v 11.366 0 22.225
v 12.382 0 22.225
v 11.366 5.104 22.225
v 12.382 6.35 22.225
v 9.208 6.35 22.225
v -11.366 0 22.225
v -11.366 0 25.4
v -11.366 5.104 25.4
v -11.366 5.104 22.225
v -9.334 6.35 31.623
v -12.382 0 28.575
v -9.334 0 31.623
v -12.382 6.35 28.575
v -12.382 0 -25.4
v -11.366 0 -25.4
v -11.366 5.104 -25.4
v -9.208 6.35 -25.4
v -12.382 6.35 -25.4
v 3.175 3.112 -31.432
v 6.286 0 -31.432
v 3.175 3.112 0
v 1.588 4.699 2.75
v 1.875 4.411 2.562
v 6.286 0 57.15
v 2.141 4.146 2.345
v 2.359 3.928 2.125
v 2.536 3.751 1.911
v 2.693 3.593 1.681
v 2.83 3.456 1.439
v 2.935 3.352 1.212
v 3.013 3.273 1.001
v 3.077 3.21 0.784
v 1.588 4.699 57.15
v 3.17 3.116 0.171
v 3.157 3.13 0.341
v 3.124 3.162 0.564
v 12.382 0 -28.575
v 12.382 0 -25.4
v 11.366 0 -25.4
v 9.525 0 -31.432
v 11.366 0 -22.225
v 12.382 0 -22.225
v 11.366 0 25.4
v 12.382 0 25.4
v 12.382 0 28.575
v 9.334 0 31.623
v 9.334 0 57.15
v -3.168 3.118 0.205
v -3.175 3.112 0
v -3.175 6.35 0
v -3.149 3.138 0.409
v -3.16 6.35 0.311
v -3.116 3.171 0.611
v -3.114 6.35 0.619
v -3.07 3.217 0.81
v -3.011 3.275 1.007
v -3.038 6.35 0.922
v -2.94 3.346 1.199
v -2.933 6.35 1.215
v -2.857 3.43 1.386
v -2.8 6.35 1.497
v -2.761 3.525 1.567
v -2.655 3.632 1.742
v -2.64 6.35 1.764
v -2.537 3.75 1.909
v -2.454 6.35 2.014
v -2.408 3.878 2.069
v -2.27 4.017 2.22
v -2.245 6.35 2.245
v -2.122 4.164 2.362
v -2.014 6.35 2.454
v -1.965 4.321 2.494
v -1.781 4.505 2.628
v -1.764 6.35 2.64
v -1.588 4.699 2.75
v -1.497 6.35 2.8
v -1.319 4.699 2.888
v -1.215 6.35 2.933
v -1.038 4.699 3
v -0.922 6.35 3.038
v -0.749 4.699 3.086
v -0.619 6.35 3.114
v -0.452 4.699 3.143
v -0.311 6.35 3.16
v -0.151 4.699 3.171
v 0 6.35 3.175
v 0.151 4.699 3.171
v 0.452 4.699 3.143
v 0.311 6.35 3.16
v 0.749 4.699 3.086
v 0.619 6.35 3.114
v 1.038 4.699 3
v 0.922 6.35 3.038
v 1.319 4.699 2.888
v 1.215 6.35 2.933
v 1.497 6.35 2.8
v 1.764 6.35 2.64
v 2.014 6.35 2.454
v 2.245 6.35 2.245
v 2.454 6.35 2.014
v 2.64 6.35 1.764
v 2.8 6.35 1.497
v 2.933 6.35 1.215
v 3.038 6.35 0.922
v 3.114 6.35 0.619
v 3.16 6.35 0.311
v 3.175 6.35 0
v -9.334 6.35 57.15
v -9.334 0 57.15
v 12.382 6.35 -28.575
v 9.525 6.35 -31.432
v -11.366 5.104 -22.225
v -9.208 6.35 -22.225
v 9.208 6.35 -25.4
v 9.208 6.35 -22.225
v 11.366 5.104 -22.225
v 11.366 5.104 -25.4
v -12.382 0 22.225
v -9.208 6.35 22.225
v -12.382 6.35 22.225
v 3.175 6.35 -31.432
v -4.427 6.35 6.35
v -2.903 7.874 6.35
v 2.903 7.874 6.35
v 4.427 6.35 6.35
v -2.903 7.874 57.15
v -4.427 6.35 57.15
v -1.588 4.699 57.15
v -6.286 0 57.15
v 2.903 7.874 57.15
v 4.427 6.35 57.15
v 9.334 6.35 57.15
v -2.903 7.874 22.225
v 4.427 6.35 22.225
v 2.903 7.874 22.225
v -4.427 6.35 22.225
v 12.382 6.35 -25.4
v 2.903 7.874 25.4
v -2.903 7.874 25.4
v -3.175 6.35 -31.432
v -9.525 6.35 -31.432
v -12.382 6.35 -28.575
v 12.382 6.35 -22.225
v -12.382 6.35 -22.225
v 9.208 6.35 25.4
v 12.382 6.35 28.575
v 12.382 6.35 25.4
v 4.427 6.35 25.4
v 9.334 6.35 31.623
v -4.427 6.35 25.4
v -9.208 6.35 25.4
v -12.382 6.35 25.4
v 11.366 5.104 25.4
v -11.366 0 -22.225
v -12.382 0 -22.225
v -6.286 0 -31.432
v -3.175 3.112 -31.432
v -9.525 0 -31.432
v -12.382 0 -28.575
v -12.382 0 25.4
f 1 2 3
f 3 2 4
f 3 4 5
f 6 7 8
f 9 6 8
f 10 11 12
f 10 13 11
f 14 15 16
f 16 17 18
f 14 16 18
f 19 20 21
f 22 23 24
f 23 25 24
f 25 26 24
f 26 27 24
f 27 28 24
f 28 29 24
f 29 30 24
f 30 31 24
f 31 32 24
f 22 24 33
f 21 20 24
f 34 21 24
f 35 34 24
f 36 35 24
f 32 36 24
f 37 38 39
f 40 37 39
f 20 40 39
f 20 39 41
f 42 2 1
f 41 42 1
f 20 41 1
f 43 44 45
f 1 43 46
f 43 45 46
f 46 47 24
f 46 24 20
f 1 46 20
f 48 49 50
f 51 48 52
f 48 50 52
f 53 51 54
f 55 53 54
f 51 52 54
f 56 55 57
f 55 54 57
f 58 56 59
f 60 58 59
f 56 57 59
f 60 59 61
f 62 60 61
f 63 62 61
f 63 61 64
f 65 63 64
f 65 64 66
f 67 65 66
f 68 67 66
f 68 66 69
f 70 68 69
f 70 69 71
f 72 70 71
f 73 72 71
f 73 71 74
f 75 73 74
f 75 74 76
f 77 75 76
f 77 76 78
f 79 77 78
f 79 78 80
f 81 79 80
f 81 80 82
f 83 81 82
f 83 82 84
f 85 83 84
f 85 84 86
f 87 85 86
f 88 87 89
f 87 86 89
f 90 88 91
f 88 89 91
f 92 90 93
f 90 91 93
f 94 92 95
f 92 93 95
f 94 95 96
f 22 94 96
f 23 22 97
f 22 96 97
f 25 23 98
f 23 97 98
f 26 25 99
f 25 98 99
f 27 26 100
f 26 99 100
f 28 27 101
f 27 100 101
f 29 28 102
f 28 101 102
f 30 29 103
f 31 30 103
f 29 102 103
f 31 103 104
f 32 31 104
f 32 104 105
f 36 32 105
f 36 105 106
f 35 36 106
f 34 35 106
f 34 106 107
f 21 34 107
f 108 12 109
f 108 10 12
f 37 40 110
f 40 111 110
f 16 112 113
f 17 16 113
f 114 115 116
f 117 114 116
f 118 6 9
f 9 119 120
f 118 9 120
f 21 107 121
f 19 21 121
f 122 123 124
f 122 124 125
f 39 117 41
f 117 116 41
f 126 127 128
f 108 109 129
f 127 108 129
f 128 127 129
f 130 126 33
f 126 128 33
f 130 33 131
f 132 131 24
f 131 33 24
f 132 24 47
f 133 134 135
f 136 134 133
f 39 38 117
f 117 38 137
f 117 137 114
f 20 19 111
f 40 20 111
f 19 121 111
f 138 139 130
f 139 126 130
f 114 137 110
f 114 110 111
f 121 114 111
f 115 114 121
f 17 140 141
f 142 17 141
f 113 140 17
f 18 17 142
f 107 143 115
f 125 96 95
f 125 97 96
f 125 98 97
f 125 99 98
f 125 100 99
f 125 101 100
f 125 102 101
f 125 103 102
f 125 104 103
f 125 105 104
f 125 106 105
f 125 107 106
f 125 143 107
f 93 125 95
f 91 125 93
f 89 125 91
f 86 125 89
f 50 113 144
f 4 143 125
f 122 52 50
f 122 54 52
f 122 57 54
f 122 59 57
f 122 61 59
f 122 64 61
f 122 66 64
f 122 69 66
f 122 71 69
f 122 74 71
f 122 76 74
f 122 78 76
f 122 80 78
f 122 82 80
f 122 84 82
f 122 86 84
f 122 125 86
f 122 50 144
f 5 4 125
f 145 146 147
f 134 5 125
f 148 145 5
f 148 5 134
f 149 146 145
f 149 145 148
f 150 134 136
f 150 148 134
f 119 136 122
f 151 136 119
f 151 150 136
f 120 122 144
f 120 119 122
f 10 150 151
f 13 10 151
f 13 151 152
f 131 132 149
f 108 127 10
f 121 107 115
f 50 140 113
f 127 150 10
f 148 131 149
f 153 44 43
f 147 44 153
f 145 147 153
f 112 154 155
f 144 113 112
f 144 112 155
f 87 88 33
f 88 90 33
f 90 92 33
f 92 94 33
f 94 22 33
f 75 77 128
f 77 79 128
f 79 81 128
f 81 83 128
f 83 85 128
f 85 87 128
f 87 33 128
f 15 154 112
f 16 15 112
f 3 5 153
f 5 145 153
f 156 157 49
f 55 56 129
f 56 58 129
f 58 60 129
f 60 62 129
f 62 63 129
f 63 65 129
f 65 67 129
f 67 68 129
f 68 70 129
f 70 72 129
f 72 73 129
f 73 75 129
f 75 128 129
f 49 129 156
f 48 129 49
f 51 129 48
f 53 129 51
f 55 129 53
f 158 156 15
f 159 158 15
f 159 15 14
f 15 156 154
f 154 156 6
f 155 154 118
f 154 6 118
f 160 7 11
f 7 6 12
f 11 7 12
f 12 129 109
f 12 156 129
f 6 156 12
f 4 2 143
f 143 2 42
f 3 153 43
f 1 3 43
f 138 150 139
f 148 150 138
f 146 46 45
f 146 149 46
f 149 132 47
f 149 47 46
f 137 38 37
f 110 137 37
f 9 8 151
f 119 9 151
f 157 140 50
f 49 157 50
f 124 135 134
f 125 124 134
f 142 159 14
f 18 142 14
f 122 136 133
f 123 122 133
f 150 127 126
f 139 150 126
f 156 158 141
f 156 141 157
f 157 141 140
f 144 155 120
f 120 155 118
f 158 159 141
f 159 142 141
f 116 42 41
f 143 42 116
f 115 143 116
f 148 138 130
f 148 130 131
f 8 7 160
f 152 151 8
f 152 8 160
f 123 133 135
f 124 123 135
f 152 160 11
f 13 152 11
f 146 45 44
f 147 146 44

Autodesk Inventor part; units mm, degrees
ref_plane "YZ Plane" through (0, 0, 0) normal (1, 0, 0) x (0, 1, 0)
ref_plane "XZ Plane" through (0, 0, 0) normal (0, 1, 0) x (-1, 0, 0)
ref_plane "XY Plane" through (0, 0, 0) normal (0, 0, 1) x (1, 0, 0)
sketch "Sketch1" plane through (0, 0, 0) normal (0, 1, 0) x (-1, 0, 0)
  line L0 (12.3825, 57.15) -> (-12.3825, 57.15)
  line L1 (-12.3825, 57.15) -> (-12.3825, -57.15)
  line L2 (-12.3825, -57.15) -> (12.3825, -57.15)
  line L3 (12.3825, -57.15) -> (12.3825, 57.15)
  line L4 (12.3825, 57.15) -> (-12.3825, -57.15) construction
  line L5 (-12.3825, 57.15) -> (12.3825, -57.15) construction
  point P0 (0, 0)
  dimension "d0" = 24.765
  dimension "d1" = 114.3
extrude "Extrusion1" add sketch "Sketch1" along normal blind 6.35
sketch "Sketch2" plane through (-12.3825, 0, 57.15) normal (0, 0, 1) x (1, 0, 0)
  line L0 (6.096, 0) -> (18.669, 0)
  line L1 (0, 0) -> (24.765, 0) projected
  line L2 (18.669, 0) -> (13.97, 4.699)
  line L3 (13.97, 4.699) -> (10.795, 4.699)
  line L4 (10.795, 4.699) -> (6.096, 0)
  line L5 (0, 6.35) -> (24.765, 6.35) projected
  point P0 (12.3825, 0)
  point P1 (12.3825, 4.699)
  point P2 (12.3825, 6.35)
  dimension "d4" = 45
  dimension "d5" = 45
  dimension "d6" = 3.175
  dimension "d7" = 4.699
extrude "Extrusion2" cut sketch "Sketch2" against normal through all
sketch "Sketch3" plane through (0, 6.35, 0) normal (0, 1, 0) x (1, 0, 0)
  line L0 (12.3825, 57.15) -> (-12.3825, 57.15) construction
  line L1 (3.175, 57.15) -> (-3.175, 57.15)
  line L2 (-3.175, 57.15) -> (-3.175, 0)
  line L3 (3.175, 0) -> (3.175, 57.15)
  arc A0 (-3.175, 0) -> (3.175, 0) centre (0, 0) ccw
  dimension "d14" = 3.175
  dimension "d15" = 57.15
extrude "Extrusion3" cut sketch "Sketch3" against normal through all
ref_plane "Work Plane1" through (12.3825, 0, -23.8125) normal (0, 0, -1) x (-1, 0, 0)
sketch "Sketch4" plane through (12.3825, 0, -23.8125) normal (0, 0, -1) x (-1, 0, 0)
  line L0 (9.2075, 3.1115) -> (9.2075, 6.35) construction
  line L1 (0, 6.35) -> (9.2075, 6.35) construction
  line L2 (0, 0) -> (0, 6.35) construction
  line L3 (0, 0) -> (6.096, 0) construction
  line L4 (6.096, 0) -> (9.2075, 3.1115) construction
  line L5 (0, 0) -> (6.096, 0) projected
  line L6 (1.016, 0) -> (0, 0)
  line L7 (0, 0) -> (0, 6.35)
  line L8 (0, 6.35) -> (9.2075, 6.35) projected
  line L9 (3.175, 6.35) -> (0, 6.35)
  line L10 (3.175, 6.35) -> (1.016, 5.1035)
  line L11 (1.016, 5.1035) -> (1.016, 0)
  point P0 (12.3825, 0)
  dimension "d19" = 150
  dimension "d20" = 1.016
  dimension "d21" = 3.175
extrude "Extrusion4" cut sketch "Sketch4" along normal mid plane 3.175
mirror "Mirror1" about plane through (0, 0, 0) normal (1, 0, 0) of "Extrusion4"
pattern_linear "Rectangular Pattern1" count 2 spacing 47.625 along (0, 0, 1) of "Extrusion4", "Mirror1"
sketch "Sketch6" plane through (-12.3825, 6.35, 57.15) normal (0, 0, 1) x (1, 0, 0)
  line L0 (6.096, -6.35) -> (10.795, -1.651) construction
  line L1 (10.795, -1.651) -> (13.97, -1.651) construction
  line L2 (13.97, -1.651) -> (18.669, -6.35) construction
  line L3 (18.669, -6.35) -> (24.765, -6.35) construction
  line L4 (24.765, -6.35) -> (24.765, 0) construction
  line L5 (0, 0) -> (24.765, 0) construction
  line L6 (0, -6.35) -> (0, 0) construction
  line L7 (0, -6.35) -> (6.096, -6.35) construction
  line L8 (9.2075, 0) -> (0, 0) projected
  line L9 (7.9559, 0) -> (9.4799, 1.524)
  line L10 (9.4799, 1.524) -> (15.2851, 1.524)
  line L11 (15.2851, 1.524) -> (16.8091, 0)
  line L12 (6.096, -6.35) -> (10.795, -1.651) projected
  line L13 (13.97, -1.651) -> (18.669, -6.35) projected
  line L14 (7.9559, 0) -> (16.8091, 0)
  line L15 (24.765, 0) -> (15.5575, 0) projected
  point P0 (12.3825, -6.35)
  point P1 (12.3825, 0)
  point P2 (12.3825, 1.524)
  dimension "d30" = 3.175
  dimension "d31" = 3.175
extrude "Extrusion5" add sketch "Sketch6" against normal blind 50.8
sketch "Sketch7" plane through (0, 6.35, 0) normal (0, 1, 0) x (1, 0, 0)
  line L0 (-9.2075, -22.225) -> (-9.2075, -25.4) projected
  line L1 (9.2075, -25.4) -> (9.2075, -22.225) projected
  line L2 (-9.2075, -25.4) -> (9.2075, -25.4)
  line L3 (9.2075, -25.4) -> (9.2075, -22.225)
  line L4 (9.2075, -22.225) -> (-9.2075, -22.225)
  line L5 (-9.2075, -22.225) -> (-9.2075, -25.4)
  point P0 (0, 0)
extrude "Extrusion6" cut sketch "Sketch7" along normal through all
sketch "Sketch8" plane through (0, 6.35, 0) normal (0, 1, 0) x (1, 0, 0)
  line L0 (12.3825, -22.225) -> (11.3665, -22.225) construction
  line L1 (11.3665, -22.225) -> (11.3665, -25.4) construction
  line L2 (11.3665, -25.4) -> (12.3825, -25.4) construction
  line L3 (12.3825, -57.15) -> (12.3825, -25.4) construction
  line L4 (6.2865, -57.15) -> (12.3825, -57.15) construction
  line L5 (6.2865, -57.15) -> (6.2865, 57.15) construction
  line L6 (12.3825, 57.15) -> (6.2865, 57.15) construction
  line L7 (12.3825, 25.4) -> (12.3825, 57.15) construction
  line L8 (12.3825, 25.4) -> (11.3665, 25.4) construction
  line L9 (11.3665, 25.4) -> (11.3665, 22.225) construction
  line L10 (11.3665, 22.225) -> (12.3825, 22.225) construction
  line L11 (12.3825, -22.225) -> (12.3825, 22.225) construction
  line L12 (-11.3665, -22.225) -> (-12.3825, -22.225) construction
  line L13 (-12.3825, 22.225) -> (-12.3825, -22.225) construction
  line L14 (-12.3825, 22.225) -> (-11.3665, 22.225) construction
  line L15 (-11.3665, 22.225) -> (-11.3665, 25.4) construction
  line L16 (-11.3665, 25.4) -> (-12.3825, 25.4) construction
  line L17 (-12.3825, 57.15) -> (-12.3825, 25.4) construction
  line L18 (-6.2865, 57.15) -> (-12.3825, 57.15) construction
  line L19 (-6.2865, 57.15) -> (-6.2865, -57.15) construction
  line L20 (-12.3825, -57.15) -> (-6.2865, -57.15) construction
  line L21 (-12.3825, -25.4) -> (-12.3825, -57.15) construction
  line L22 (-12.3825, -25.4) -> (-11.3665, -25.4) construction
  line L23 (-11.3665, -25.4) -> (-11.3665, -22.225) construction
  line L24 (-12.3825, -25.4) -> (-12.3825, -57.15) projected
  line L25 (-12.3825, -28.575) -> (-9.3345, -31.623)
  line L26 (-9.3345, -31.623) -> (-9.3345, -57.15)
  line L27 (-12.3825, -57.15) -> (-6.2865, -57.15) projected
  line L28 (-12.3825, -57.15) -> (-9.3345, -57.15)
  line L29 (-12.3825, -57.15) -> (-12.3825, -28.575)
  line L30 (-12.3825, 57.15) -> (-12.3825, 25.4) construction
  line L31 (-12.3825, 28.575) -> (-9.525, 31.4325)
  line L32 (-9.525, 31.4325) -> (-3.175, 31.4325)
  line L33 (-3.175, 57.15) -> (-3.175, 0) construction
  line L34 (-3.175, 57.15) -> (-6.2865, 57.15) projected
  line L35 (-3.175, 31.4325) -> (-3.175, 57.15)
  line L36 (-3.175, 57.15) -> (-12.3825, 57.15)
  line L37 (-12.3825, 28.575) -> (-12.3825, 57.15)
  point P0 (0, 0)
  dimension "d36" = 45
  dimension "d37" = 3.175
  dimension "d38" = 3.175
  dimension "d39" = 45
  dimension "d40" = 6.35
extrude "Extrusion7" cut sketch "Sketch8" against normal through all
mirror "Mirror2" about plane through (0, 0, 0) normal (1, 0, 0) of "Extrusion7"
equation "\"d38\" = d37"
equation "\"d39\" = d36"
properties part number "Holder_Slide_Top"
